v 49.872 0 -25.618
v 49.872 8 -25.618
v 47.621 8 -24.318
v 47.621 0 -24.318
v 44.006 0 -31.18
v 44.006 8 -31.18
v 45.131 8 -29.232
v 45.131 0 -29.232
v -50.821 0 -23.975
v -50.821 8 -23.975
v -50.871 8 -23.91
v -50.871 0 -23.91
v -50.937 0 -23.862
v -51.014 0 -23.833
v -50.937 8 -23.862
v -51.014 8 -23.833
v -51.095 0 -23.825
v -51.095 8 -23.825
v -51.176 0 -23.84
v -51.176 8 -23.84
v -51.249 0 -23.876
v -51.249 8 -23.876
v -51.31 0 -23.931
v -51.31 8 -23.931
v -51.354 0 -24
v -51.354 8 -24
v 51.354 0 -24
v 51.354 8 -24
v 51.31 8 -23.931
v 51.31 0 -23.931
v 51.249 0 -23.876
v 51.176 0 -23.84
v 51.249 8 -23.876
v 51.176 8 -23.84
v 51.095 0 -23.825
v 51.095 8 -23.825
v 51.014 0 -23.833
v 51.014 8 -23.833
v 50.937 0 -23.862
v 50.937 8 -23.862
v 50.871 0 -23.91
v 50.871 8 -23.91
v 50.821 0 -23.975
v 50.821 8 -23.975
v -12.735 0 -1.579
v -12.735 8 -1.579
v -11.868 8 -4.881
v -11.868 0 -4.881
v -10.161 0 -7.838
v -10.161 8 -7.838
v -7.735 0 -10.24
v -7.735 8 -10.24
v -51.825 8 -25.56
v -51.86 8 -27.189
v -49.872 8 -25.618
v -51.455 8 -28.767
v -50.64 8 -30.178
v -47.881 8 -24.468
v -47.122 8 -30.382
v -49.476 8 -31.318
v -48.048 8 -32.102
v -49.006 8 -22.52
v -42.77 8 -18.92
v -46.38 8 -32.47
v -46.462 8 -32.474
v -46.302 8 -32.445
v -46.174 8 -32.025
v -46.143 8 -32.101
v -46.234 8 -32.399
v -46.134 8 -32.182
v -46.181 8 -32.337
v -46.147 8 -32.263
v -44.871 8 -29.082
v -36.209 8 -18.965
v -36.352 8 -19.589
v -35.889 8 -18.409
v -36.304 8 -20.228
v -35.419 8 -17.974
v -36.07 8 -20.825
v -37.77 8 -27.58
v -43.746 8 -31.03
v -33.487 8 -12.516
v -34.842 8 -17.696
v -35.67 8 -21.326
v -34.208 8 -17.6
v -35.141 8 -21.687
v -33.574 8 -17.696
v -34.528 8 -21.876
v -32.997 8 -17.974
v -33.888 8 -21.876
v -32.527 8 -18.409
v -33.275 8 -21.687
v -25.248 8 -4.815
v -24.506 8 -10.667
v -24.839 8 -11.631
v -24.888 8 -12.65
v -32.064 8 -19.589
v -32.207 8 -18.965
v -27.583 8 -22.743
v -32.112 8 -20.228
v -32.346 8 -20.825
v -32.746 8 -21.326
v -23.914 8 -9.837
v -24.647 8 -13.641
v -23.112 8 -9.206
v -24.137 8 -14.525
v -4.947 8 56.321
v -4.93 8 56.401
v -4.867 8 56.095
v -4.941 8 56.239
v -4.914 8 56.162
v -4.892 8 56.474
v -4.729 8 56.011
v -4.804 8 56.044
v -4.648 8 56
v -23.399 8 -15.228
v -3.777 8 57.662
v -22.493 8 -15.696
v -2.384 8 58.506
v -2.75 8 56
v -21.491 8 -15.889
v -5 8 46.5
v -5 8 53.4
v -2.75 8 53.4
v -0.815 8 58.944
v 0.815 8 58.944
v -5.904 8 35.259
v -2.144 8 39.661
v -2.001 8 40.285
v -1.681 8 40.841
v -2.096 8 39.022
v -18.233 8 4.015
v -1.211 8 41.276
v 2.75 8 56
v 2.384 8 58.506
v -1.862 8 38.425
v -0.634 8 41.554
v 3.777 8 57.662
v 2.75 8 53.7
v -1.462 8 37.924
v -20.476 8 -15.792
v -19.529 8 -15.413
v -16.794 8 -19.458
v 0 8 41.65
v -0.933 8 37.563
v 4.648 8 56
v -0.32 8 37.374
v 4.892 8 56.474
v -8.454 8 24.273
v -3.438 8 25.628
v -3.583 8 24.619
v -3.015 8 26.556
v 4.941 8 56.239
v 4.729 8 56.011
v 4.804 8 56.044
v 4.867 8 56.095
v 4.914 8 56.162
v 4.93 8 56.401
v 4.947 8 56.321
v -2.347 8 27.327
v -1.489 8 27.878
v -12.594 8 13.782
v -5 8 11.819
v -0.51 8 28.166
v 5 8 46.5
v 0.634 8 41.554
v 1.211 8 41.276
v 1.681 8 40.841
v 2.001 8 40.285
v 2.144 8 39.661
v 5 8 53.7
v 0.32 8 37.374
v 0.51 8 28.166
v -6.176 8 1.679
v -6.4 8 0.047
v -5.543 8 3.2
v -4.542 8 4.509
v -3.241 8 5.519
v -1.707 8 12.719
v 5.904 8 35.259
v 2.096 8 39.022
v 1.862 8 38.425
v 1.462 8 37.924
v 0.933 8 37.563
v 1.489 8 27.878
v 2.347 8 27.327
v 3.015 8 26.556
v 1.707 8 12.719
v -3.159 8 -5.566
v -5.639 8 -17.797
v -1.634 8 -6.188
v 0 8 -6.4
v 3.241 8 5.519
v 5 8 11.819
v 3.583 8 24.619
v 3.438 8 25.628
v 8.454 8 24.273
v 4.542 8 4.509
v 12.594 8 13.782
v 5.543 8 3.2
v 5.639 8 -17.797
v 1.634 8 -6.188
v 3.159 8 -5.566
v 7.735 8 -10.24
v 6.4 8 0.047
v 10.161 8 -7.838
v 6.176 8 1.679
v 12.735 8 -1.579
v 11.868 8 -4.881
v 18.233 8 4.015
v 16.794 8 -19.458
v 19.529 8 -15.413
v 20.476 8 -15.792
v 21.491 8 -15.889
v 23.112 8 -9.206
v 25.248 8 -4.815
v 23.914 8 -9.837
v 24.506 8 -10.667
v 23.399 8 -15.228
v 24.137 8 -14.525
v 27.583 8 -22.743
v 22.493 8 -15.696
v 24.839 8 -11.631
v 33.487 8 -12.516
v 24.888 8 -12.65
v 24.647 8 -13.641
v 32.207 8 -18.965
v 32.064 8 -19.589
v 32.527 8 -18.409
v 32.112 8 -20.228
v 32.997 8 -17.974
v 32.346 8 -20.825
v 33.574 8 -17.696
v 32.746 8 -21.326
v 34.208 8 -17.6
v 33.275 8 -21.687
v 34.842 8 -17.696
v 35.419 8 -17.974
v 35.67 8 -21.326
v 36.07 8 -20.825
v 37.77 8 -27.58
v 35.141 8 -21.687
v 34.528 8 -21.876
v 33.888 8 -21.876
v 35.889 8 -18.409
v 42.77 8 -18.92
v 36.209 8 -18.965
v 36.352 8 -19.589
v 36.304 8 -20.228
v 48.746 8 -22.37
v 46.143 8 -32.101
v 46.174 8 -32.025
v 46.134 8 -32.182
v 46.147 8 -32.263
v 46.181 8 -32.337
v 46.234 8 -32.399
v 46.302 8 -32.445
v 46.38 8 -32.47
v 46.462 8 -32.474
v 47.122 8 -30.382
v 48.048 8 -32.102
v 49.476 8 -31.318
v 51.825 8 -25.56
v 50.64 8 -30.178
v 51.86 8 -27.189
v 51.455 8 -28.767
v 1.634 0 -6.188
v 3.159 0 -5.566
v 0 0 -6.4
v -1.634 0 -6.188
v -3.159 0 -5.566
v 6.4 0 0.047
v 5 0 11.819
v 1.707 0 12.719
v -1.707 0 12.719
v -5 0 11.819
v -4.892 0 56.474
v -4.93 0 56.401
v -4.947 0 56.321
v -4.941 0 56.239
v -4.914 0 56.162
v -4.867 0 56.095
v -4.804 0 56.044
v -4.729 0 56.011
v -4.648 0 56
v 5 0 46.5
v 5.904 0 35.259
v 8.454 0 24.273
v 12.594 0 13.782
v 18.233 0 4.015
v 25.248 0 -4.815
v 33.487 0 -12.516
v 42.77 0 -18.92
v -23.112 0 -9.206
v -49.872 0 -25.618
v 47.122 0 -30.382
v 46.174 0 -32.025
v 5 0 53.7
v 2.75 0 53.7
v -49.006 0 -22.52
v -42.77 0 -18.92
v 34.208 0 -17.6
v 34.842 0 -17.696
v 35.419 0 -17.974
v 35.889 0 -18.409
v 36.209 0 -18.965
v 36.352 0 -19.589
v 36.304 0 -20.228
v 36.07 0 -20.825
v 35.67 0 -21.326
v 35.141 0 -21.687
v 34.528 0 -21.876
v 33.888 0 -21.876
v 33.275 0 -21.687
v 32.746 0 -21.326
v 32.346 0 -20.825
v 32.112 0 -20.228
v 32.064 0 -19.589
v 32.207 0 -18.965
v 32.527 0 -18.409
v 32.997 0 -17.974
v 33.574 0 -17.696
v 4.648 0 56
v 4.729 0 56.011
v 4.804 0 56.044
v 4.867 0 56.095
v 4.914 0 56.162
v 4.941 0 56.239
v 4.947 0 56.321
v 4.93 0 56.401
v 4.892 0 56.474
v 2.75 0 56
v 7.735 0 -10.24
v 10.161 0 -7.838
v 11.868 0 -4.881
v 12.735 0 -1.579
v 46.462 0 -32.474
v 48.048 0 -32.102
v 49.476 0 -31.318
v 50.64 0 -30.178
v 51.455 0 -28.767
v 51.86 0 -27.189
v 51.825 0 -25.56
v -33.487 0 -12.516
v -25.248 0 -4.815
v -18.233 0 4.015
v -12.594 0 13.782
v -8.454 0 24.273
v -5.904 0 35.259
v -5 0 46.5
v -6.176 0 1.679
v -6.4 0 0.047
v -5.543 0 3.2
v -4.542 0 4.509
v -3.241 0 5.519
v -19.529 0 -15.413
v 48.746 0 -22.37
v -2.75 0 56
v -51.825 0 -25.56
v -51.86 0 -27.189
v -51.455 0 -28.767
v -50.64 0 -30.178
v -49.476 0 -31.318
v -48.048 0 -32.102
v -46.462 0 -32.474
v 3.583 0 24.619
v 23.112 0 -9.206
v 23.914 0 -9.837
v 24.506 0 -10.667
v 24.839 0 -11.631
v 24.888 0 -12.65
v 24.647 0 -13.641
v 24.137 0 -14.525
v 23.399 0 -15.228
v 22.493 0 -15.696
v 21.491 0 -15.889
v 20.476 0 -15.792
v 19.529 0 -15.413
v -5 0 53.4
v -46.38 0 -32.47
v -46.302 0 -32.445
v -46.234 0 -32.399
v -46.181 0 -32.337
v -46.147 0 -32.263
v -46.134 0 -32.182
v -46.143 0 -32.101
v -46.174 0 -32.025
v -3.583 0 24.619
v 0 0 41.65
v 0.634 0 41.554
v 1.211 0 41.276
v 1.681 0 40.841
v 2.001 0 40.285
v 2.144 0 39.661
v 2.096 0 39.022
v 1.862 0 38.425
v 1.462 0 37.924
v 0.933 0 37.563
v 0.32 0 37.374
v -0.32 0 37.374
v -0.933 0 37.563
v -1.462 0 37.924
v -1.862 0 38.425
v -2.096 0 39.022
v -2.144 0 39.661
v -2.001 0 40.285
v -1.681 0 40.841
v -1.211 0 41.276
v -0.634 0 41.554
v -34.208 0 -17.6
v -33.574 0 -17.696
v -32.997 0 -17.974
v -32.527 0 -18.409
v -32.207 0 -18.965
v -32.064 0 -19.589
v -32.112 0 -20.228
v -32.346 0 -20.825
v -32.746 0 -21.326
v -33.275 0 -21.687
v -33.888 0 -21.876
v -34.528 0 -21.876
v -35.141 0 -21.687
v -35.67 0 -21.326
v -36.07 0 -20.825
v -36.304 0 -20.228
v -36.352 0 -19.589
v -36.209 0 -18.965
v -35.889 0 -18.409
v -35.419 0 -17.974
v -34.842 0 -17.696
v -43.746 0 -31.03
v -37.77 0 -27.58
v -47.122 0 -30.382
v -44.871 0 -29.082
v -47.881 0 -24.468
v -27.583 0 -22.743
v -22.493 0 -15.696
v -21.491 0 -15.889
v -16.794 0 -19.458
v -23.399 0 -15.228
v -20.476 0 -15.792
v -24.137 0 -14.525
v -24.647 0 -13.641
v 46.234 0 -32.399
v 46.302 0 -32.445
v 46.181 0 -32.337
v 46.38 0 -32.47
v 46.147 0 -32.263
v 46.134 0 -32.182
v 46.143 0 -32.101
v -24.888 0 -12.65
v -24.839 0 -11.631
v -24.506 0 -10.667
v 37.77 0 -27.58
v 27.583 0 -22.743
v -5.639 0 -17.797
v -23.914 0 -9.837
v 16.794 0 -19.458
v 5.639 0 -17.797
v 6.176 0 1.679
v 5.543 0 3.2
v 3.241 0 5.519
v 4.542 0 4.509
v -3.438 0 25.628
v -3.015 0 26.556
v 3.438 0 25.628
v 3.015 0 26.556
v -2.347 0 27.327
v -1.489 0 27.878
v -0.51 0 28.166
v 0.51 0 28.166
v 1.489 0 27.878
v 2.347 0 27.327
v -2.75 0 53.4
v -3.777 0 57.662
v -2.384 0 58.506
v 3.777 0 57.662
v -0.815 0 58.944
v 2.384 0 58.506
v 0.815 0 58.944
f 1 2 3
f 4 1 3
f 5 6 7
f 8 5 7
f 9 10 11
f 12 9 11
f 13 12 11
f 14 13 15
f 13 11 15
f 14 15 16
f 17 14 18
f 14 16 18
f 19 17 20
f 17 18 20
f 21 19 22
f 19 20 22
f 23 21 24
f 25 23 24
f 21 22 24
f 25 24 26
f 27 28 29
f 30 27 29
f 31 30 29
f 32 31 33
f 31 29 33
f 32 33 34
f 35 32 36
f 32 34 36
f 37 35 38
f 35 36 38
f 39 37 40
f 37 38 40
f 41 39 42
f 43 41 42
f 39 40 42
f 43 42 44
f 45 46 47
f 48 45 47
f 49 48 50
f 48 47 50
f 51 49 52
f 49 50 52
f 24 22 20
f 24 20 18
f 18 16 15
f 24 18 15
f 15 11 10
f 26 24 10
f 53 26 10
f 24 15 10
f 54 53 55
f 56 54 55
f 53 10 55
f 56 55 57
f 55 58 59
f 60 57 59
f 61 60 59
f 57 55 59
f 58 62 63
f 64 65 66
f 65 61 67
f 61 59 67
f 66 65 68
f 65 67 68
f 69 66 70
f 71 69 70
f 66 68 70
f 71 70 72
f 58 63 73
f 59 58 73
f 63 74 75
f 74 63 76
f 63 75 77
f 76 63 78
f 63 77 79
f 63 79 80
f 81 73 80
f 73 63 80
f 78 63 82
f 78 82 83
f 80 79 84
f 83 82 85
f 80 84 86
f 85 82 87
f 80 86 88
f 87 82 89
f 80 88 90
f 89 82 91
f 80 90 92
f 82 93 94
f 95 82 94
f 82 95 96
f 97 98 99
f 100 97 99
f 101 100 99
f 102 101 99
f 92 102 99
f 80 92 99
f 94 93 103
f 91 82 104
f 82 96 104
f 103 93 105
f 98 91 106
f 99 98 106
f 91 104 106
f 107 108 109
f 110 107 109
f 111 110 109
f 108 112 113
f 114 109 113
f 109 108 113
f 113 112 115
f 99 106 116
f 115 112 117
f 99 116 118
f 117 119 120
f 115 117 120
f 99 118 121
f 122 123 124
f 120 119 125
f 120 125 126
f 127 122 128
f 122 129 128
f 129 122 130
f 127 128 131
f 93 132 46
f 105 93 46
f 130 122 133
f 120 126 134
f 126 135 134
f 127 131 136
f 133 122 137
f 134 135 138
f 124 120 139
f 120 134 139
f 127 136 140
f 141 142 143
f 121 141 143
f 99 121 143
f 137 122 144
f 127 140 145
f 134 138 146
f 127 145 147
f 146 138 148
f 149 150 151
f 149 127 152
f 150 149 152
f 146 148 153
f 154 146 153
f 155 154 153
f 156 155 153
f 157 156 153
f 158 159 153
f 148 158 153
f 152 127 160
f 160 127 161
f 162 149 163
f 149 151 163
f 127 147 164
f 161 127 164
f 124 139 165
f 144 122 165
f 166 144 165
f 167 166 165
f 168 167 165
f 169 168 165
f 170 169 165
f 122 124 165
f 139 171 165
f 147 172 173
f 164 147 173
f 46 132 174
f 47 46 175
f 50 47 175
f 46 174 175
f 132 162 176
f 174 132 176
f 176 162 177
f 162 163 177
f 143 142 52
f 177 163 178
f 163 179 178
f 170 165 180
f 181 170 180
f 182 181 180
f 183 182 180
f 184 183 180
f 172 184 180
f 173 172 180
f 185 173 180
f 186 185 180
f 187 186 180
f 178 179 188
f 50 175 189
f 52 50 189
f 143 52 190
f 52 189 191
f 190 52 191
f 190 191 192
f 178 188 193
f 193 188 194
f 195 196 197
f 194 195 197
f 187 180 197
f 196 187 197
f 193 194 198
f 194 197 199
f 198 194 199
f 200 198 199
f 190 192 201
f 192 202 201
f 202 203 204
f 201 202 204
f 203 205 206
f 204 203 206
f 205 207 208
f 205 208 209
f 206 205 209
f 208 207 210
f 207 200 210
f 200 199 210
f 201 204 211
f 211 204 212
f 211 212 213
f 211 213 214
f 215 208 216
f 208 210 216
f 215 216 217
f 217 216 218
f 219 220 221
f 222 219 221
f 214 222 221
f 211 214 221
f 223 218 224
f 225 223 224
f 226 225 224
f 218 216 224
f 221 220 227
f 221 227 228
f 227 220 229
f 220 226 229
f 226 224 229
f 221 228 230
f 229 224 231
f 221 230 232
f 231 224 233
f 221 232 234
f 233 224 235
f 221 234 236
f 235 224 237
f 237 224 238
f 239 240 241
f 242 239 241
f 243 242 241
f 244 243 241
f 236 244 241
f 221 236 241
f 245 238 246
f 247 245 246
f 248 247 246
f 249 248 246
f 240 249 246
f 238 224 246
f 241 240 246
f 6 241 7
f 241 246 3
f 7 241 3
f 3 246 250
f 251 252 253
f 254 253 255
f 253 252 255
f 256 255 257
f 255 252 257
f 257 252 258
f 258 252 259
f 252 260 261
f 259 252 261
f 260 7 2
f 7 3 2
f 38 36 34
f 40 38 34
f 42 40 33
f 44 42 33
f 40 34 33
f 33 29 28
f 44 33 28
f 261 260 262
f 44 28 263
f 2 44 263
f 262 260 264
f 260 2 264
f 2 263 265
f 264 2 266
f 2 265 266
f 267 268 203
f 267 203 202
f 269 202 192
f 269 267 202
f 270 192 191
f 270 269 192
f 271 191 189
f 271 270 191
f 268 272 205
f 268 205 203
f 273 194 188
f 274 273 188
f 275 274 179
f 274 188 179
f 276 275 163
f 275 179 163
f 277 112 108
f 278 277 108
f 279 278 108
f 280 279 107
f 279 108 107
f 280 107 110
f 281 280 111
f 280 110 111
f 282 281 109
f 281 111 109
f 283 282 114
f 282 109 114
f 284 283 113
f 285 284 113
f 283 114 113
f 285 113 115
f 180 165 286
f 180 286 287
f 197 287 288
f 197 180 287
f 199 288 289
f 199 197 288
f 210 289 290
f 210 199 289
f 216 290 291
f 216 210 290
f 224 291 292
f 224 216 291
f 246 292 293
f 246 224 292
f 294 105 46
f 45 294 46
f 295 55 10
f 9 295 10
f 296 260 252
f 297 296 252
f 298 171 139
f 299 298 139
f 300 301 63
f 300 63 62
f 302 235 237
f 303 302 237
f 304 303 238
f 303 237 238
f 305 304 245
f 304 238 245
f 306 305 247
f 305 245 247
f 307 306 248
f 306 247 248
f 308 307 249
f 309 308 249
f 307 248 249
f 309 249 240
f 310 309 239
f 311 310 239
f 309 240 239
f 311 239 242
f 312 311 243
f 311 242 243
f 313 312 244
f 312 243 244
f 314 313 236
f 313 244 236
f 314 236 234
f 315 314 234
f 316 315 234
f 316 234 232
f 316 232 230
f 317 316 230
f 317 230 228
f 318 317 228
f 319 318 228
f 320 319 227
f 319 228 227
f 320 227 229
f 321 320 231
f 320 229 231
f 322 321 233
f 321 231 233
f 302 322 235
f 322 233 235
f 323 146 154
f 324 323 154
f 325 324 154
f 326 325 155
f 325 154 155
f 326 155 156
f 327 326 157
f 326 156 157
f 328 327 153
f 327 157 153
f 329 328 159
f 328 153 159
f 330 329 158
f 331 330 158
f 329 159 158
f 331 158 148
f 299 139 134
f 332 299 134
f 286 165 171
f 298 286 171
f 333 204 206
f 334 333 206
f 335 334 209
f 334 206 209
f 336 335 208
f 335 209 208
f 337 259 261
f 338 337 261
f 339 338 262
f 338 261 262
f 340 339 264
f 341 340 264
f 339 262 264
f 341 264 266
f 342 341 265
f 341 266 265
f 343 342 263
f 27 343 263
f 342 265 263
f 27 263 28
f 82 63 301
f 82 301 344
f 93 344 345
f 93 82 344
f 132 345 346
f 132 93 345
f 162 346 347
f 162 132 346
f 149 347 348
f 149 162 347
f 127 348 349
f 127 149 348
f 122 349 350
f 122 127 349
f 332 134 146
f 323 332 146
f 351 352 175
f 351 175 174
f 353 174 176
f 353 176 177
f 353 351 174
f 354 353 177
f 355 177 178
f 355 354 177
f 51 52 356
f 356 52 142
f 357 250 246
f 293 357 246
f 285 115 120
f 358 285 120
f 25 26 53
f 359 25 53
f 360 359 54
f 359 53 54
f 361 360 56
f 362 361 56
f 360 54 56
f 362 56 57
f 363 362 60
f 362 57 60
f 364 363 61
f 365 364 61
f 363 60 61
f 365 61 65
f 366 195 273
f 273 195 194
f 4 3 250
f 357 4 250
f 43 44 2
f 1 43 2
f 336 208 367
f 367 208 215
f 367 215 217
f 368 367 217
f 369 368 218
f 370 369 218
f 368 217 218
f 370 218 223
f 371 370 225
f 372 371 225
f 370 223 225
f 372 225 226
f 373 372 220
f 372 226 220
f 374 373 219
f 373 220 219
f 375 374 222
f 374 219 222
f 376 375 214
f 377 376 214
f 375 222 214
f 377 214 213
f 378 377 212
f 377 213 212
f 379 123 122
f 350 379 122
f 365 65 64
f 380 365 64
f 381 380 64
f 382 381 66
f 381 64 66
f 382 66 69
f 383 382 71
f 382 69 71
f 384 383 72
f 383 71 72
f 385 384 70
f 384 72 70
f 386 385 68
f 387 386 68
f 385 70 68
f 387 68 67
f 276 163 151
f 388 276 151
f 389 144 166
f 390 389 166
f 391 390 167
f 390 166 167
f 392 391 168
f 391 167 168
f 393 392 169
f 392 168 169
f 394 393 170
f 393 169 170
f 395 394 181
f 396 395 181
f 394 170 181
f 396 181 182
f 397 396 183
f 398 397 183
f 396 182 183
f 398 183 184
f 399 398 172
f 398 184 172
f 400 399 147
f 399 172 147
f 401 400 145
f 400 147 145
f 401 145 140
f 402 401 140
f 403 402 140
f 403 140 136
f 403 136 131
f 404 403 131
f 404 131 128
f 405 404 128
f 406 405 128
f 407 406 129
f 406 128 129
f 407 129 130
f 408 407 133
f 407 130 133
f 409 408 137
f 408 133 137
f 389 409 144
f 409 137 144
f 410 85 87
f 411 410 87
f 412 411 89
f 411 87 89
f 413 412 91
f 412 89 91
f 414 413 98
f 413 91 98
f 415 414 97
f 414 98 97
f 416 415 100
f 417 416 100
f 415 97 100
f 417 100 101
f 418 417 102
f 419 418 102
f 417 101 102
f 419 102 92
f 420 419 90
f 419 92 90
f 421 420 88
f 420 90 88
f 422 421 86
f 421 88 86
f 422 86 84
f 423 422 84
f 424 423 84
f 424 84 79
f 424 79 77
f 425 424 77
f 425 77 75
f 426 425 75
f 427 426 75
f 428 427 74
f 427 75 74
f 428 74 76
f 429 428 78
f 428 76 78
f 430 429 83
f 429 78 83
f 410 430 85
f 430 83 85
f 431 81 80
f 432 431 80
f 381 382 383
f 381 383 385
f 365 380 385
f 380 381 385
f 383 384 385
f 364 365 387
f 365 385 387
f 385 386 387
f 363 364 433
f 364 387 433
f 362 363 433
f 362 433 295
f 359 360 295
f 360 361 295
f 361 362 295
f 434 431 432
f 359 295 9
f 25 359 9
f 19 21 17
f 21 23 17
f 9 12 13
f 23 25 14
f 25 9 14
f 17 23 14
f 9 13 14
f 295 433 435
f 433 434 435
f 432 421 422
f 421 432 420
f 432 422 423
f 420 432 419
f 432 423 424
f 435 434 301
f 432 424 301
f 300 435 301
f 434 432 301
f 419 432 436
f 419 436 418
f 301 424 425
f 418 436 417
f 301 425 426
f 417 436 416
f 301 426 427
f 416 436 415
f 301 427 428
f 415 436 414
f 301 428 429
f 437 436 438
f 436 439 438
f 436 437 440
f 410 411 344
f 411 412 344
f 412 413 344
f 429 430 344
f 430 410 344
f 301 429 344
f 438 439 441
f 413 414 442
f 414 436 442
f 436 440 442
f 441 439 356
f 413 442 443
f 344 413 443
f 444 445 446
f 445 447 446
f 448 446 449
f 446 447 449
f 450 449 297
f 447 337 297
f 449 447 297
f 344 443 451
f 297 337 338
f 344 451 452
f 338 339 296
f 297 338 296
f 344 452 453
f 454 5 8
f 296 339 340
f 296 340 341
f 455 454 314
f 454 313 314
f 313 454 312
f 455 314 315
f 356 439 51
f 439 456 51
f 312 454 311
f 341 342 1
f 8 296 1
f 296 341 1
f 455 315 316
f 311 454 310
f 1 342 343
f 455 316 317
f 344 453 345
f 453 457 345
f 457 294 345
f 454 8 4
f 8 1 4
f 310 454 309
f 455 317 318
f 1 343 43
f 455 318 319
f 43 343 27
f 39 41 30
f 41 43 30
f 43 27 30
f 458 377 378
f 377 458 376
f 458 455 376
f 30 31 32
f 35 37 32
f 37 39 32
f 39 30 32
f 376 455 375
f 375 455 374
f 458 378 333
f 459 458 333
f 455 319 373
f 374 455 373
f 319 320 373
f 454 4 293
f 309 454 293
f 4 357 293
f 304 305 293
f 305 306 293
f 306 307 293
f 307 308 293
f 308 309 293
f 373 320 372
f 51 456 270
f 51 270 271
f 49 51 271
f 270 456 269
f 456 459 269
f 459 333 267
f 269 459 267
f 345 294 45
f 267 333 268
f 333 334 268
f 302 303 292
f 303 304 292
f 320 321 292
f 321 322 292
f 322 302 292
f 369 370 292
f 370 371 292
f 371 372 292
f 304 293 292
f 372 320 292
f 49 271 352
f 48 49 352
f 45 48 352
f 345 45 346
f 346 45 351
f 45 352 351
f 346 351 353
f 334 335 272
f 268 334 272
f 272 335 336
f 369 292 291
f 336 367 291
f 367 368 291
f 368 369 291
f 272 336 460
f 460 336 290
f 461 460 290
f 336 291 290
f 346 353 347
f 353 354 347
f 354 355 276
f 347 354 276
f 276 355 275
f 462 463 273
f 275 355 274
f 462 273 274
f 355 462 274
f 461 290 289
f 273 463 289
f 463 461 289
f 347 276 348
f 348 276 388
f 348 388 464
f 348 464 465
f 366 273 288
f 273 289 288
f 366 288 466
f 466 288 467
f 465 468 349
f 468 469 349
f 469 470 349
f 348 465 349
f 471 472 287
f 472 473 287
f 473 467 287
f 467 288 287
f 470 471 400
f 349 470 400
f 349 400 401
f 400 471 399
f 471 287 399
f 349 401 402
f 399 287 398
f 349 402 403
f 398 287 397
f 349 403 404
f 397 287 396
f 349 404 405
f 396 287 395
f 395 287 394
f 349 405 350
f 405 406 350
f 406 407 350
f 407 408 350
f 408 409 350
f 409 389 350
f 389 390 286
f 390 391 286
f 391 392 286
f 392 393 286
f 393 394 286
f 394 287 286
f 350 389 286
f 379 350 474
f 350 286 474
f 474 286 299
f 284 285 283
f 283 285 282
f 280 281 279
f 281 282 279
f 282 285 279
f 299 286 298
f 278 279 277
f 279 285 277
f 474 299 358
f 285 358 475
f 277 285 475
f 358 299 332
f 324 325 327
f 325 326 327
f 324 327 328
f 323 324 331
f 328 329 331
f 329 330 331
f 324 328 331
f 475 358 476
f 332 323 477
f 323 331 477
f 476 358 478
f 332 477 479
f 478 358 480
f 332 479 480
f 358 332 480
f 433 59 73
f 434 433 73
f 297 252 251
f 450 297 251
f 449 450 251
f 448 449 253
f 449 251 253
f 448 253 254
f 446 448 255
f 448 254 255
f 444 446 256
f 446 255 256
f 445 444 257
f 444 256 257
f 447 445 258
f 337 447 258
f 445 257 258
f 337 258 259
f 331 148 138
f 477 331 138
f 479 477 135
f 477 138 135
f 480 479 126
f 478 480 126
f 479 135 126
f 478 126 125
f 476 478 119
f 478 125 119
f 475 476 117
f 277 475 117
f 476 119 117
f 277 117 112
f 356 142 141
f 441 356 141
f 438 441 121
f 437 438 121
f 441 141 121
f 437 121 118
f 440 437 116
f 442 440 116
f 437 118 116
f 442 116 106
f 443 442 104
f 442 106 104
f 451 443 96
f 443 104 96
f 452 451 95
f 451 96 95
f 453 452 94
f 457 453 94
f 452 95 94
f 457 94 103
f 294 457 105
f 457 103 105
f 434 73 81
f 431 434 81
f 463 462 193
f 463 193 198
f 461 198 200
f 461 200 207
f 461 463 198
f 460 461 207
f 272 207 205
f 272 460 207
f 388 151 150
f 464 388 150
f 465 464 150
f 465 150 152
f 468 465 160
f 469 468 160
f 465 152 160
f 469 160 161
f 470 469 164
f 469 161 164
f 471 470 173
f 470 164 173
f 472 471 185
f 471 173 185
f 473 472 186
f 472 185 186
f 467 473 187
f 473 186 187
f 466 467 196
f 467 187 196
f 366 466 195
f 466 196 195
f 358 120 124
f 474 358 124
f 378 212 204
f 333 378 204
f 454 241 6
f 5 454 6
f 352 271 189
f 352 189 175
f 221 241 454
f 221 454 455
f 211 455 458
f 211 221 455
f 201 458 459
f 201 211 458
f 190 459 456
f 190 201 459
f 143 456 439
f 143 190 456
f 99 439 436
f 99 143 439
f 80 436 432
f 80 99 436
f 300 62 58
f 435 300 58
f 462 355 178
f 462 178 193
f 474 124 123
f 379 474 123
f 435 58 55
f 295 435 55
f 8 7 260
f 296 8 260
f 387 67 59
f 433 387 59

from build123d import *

# Parameters (mm, degrees)
BOSS_EXTRUDE1_DEPTH          = 8
CUT_EXTRUDE1_DEPTH           = 10
ESQUISSE1_W                  = 10
ESQUISSE1_H                  = 25.654784636
BOSS_EXTRU_1_DEPTH           = 8
R_P_TITION_CIRCULAIRE3_COUNT = 3
ESQUISSE3_R                  = 2.15
ENL_V_MAT_EXTRU_1_DEPTH      = 8
BOSS_EXTRU_4_DEPTH           = 8
R_P_TITION_CIRCULAIRE4_COUNT = 3
BOSS_EXTRU_5_DEPTH           = 8
R_P_TITION_CIRCULAIRE5_COUNT = 3
ENL_V_MAT_EXTRU_4_DEPTH      = 10


with BuildPart() as part:
    # Sketch1 → Boss-Extrude1 (new body)
    with BuildSketch(Plane(origin=(0, 0, 0), x_dir=(1, 0, 0), z_dir=(0, 1, 0))):
        Polygon((0, 22.607508486), (-18.985035039, 16.354559035), (-23.655981112, 8.264243118), (-19.578676665, -11.303754243), (-4.670946073, -24.618802154), (4.670946073, -24.618802154), (19.578676665, -11.303754243), (23.655981112, 8.264243118), (18.985035039, 16.354559035), align=None)
        with BuildLine():
            Line((-3.15901992, 5.566021303), (-6.399825806, -0.047219149))
            ThreePointArc((-6.399825806, -0.047219149), (-5.542562584, -3.2), (-3.240805886, -5.518802154))
            Line((-3.240805886, -5.518802154), (3.240805886, -5.518802154))
            ThreePointArc((3.240805886, -5.518802154), (5.542562584, -3.2), (6.399825806, -0.047219149))
            Line((6.399825806, -0.047219149), (3.15901992, 5.566021303))
            ThreePointArc((3.15901992, 5.566021303), (0, 6.4), (-3.15901992, 5.566021303))
        make_face(mode=Mode.SUBTRACT)
    extrude(amount=BOSS_EXTRUDE1_DEPTH)

    # Sketch3 → Cut-Extrude1 (cut)
    with BuildSketch(Plane(origin=(0, 8, 0), x_dir=(1, 0, 0), z_dir=(0, 1, 0))):
        with BuildLine():
            Line((-18.985035039, 16.354559035), (0, 25.029979083))
            Line((0, 25.029979083), (18.985035039, 16.354559035))
            ThreePointArc((18.985035039, 16.354559035), (0, 11.607508486), (-18.985035039, 16.354559035))
        make_face()
        with BuildLine():
            Line((23.655981112, 8.264243118), (24.53433034, -16.532203716))
            Line((24.53433034, -16.532203716), (4.670946073, -24.618802154))
            ThreePointArc((4.670946073, -24.618802154), (10.052397223, -5.803754243), (23.655981112, 8.264243118))
        make_face()
        with BuildLine():
            Line((-23.655981112, 8.264243118), (-26.351688143, -12.502410327))
            Line((-26.351688143, -12.502410327), (-4.670946073, -24.618802154))
            ThreePointArc((-4.670946073, -24.618802154), (-10.052397223, -5.803754243), (-23.655981112, 8.264243118))
        make_face()
    extrude(amount=-CUT_EXTRUDE1_DEPTH, mode=Mode.SUBTRACT)

    # Esquisse1 → Boss.-Extru.1 (add)
    with BuildSketch(Plane.XZ):
        with Locations((0, 33.672607682)):
            Rectangle(ESQUISSE1_W, ESQUISSE1_H)
    boss_extru_1 = extrude(amount=-BOSS_EXTRU_1_DEPTH)

    # Répétition circulaire3: Boss.-Extru.1 ×3 about axis
    r_p_tition_circulaire3_axis = Axis((0, 0, 0), (0, 1, 0))
    for i in range(1, R_P_TITION_CIRCULAIRE3_COUNT):
        add(boss_extru_1.rotate(r_p_tition_circulaire3_axis, i * 360 / R_P_TITION_CIRCULAIRE3_COUNT))

    # Esquisse3 → Enlèv. mat.-Extru.1 (cut)
    with BuildSketch(Plane(origin=(0, 8, 0), x_dir=(1, 0, 0), z_dir=(0, 1, 0))):
        with Locations((0, -39.5)):
            Circle(ESQUISSE3_R)
        with Locations((34.208003449, 19.75)):
            Circle(ESQUISSE3_R)
        with Locations((-34.208003449, 19.75)):
            Circle(ESQUISSE3_R)
    extrude(amount=-ENL_V_MAT_EXTRU_1_DEPTH, mode=Mode.SUBTRACT)

    # Esquisse5 → Boss.-Extru.4 (add)
    with BuildSketch(Plane(origin=(0, 8, 0), x_dir=(1, 0, 0), z_dir=(0, 1, 0))):
        with BuildLine():
            Line((-5, -46.5), (5, -46.5))
            Line((5, -46.5), (5, -53.7))
            Line((5, -53.7), (2.75, -53.7))
            Line((2.75, -53.7), (2.75, -56))
            Line((2.75, -56), (4.647580015, -56))
            ThreePointArc((4.647580015, -56), (4.91413701, -56.16235056), (4.89218949, -56.473684211))
            ThreePointArc((4.89218949, -56.473684211), (0, -59), (-4.89218949, -56.473684211))
            ThreePointArc((-4.89218949, -56.473684211), (-4.91413701, -56.16235056), (-4.647580015, -56))
            Line((-4.647580015, -56), (-2.75, -56))
            Line((-2.75, -56), (-2.75, -53.4))
            Line((-2.75, -53.4), (-5, -53.4))
            Line((-5, -53.4), (-5, -46.5))
        make_face()
    boss_extru_4 = extrude(amount=-BOSS_EXTRU_4_DEPTH)

    # Répétition circulaire4: Boss.-Extru.4 ×3 about axis
    r_p_tition_circulaire4_axis = Axis((0, 0, 0), (0, 1, 0))
    for i in range(1, R_P_TITION_CIRCULAIRE4_COUNT):
        add(boss_extru_4.rotate(r_p_tition_circulaire4_axis, i * 360 / R_P_TITION_CIRCULAIRE4_COUNT))

    # Esquisse6 → Boss.-Extru.5 (add)
    with BuildSketch(Plane(origin=(0, 8, 0), x_dir=(1, 0, 0), z_dir=(0, 1, 0))):
        with BuildLine():
            Line((4.242203457, -21.192425308), (5, -46.5))
            ThreePointArc((5, -46.5), (15.232576769, -8.794532298), (42.770181276, 18.919872981))
            Line((42.770181276, 18.919872981), (24.63344488, 10.3797127))
            Line((24.63344488, 10.3797127), (9.134543243, -3.221955174))
            Line((9.134543243, -3.221955174), (4.242203457, -21.192425308))
        make_face()
    boss_extru_5 = extrude(amount=-BOSS_EXTRU_5_DEPTH)

    # Répétition circulaire5: Boss.-Extru.5 ×3 about axis
    r_p_tition_circulaire5_axis = Axis((0, 0, 0), (0, 1, 0))
    for i in range(1, R_P_TITION_CIRCULAIRE5_COUNT):
        add(boss_extru_5.rotate(r_p_tition_circulaire5_axis, i * 360 / R_P_TITION_CIRCULAIRE5_COUNT))

    # Esquisse12 → Enlèv. mat.-Extru.4 (cut)
    with BuildSketch(Plane(origin=(0, 8, 0), x_dir=(1, 0, 0), z_dir=(0, 1, 0))):
        with BuildLine():
            Line((-7.735382907, 10.239528096), (-19.528767297, 15.41278714))
            ThreePointArc((-19.528767297, 15.41278714), (-24.423894139, 14.101141856), (-23.112248854, 9.206015014))
            Line((-23.112248854, 9.206015014), (-12.735382907, 1.579274058))
            ThreePointArc((-12.735382907, 1.579274058), (-11.113643114, 6.416464843), (-7.735382907, 10.239528096))
        make_face()
        with BuildLine():
            Line((-5, -11.818802154), (-3.583481558, -24.618802154))
            ThreePointArc((-3.583481558, -24.618802154), (0, -28.202283711), (3.583481558, -24.618802154))
            Line((3.583481558, -24.618802154), (5, -11.818802154))
            ThreePointArc((5, -11.818802154), (0, -12.832929687), (-5, -11.818802154))
        make_face()
        with BuildLine():
            Line((12.735382907, 1.579274058), (23.112248854, 9.206015014))
            ThreePointArc((23.112248854, 9.206015014), (24.423894139, 14.101141856), (19.528767297, 15.41278714))
            Line((19.528767297, 15.41278714), (7.735382907, 10.239528096))
            ThreePointArc((7.735382907, 10.239528096), (11.113643114, 6.416464843), (12.735382907, 1.579274058))
        make_face()
    extrude(amount=-ENL_V_MAT_EXTRU_4_DEPTH, mode=Mode.SUBTRACT)


solid = part.part
